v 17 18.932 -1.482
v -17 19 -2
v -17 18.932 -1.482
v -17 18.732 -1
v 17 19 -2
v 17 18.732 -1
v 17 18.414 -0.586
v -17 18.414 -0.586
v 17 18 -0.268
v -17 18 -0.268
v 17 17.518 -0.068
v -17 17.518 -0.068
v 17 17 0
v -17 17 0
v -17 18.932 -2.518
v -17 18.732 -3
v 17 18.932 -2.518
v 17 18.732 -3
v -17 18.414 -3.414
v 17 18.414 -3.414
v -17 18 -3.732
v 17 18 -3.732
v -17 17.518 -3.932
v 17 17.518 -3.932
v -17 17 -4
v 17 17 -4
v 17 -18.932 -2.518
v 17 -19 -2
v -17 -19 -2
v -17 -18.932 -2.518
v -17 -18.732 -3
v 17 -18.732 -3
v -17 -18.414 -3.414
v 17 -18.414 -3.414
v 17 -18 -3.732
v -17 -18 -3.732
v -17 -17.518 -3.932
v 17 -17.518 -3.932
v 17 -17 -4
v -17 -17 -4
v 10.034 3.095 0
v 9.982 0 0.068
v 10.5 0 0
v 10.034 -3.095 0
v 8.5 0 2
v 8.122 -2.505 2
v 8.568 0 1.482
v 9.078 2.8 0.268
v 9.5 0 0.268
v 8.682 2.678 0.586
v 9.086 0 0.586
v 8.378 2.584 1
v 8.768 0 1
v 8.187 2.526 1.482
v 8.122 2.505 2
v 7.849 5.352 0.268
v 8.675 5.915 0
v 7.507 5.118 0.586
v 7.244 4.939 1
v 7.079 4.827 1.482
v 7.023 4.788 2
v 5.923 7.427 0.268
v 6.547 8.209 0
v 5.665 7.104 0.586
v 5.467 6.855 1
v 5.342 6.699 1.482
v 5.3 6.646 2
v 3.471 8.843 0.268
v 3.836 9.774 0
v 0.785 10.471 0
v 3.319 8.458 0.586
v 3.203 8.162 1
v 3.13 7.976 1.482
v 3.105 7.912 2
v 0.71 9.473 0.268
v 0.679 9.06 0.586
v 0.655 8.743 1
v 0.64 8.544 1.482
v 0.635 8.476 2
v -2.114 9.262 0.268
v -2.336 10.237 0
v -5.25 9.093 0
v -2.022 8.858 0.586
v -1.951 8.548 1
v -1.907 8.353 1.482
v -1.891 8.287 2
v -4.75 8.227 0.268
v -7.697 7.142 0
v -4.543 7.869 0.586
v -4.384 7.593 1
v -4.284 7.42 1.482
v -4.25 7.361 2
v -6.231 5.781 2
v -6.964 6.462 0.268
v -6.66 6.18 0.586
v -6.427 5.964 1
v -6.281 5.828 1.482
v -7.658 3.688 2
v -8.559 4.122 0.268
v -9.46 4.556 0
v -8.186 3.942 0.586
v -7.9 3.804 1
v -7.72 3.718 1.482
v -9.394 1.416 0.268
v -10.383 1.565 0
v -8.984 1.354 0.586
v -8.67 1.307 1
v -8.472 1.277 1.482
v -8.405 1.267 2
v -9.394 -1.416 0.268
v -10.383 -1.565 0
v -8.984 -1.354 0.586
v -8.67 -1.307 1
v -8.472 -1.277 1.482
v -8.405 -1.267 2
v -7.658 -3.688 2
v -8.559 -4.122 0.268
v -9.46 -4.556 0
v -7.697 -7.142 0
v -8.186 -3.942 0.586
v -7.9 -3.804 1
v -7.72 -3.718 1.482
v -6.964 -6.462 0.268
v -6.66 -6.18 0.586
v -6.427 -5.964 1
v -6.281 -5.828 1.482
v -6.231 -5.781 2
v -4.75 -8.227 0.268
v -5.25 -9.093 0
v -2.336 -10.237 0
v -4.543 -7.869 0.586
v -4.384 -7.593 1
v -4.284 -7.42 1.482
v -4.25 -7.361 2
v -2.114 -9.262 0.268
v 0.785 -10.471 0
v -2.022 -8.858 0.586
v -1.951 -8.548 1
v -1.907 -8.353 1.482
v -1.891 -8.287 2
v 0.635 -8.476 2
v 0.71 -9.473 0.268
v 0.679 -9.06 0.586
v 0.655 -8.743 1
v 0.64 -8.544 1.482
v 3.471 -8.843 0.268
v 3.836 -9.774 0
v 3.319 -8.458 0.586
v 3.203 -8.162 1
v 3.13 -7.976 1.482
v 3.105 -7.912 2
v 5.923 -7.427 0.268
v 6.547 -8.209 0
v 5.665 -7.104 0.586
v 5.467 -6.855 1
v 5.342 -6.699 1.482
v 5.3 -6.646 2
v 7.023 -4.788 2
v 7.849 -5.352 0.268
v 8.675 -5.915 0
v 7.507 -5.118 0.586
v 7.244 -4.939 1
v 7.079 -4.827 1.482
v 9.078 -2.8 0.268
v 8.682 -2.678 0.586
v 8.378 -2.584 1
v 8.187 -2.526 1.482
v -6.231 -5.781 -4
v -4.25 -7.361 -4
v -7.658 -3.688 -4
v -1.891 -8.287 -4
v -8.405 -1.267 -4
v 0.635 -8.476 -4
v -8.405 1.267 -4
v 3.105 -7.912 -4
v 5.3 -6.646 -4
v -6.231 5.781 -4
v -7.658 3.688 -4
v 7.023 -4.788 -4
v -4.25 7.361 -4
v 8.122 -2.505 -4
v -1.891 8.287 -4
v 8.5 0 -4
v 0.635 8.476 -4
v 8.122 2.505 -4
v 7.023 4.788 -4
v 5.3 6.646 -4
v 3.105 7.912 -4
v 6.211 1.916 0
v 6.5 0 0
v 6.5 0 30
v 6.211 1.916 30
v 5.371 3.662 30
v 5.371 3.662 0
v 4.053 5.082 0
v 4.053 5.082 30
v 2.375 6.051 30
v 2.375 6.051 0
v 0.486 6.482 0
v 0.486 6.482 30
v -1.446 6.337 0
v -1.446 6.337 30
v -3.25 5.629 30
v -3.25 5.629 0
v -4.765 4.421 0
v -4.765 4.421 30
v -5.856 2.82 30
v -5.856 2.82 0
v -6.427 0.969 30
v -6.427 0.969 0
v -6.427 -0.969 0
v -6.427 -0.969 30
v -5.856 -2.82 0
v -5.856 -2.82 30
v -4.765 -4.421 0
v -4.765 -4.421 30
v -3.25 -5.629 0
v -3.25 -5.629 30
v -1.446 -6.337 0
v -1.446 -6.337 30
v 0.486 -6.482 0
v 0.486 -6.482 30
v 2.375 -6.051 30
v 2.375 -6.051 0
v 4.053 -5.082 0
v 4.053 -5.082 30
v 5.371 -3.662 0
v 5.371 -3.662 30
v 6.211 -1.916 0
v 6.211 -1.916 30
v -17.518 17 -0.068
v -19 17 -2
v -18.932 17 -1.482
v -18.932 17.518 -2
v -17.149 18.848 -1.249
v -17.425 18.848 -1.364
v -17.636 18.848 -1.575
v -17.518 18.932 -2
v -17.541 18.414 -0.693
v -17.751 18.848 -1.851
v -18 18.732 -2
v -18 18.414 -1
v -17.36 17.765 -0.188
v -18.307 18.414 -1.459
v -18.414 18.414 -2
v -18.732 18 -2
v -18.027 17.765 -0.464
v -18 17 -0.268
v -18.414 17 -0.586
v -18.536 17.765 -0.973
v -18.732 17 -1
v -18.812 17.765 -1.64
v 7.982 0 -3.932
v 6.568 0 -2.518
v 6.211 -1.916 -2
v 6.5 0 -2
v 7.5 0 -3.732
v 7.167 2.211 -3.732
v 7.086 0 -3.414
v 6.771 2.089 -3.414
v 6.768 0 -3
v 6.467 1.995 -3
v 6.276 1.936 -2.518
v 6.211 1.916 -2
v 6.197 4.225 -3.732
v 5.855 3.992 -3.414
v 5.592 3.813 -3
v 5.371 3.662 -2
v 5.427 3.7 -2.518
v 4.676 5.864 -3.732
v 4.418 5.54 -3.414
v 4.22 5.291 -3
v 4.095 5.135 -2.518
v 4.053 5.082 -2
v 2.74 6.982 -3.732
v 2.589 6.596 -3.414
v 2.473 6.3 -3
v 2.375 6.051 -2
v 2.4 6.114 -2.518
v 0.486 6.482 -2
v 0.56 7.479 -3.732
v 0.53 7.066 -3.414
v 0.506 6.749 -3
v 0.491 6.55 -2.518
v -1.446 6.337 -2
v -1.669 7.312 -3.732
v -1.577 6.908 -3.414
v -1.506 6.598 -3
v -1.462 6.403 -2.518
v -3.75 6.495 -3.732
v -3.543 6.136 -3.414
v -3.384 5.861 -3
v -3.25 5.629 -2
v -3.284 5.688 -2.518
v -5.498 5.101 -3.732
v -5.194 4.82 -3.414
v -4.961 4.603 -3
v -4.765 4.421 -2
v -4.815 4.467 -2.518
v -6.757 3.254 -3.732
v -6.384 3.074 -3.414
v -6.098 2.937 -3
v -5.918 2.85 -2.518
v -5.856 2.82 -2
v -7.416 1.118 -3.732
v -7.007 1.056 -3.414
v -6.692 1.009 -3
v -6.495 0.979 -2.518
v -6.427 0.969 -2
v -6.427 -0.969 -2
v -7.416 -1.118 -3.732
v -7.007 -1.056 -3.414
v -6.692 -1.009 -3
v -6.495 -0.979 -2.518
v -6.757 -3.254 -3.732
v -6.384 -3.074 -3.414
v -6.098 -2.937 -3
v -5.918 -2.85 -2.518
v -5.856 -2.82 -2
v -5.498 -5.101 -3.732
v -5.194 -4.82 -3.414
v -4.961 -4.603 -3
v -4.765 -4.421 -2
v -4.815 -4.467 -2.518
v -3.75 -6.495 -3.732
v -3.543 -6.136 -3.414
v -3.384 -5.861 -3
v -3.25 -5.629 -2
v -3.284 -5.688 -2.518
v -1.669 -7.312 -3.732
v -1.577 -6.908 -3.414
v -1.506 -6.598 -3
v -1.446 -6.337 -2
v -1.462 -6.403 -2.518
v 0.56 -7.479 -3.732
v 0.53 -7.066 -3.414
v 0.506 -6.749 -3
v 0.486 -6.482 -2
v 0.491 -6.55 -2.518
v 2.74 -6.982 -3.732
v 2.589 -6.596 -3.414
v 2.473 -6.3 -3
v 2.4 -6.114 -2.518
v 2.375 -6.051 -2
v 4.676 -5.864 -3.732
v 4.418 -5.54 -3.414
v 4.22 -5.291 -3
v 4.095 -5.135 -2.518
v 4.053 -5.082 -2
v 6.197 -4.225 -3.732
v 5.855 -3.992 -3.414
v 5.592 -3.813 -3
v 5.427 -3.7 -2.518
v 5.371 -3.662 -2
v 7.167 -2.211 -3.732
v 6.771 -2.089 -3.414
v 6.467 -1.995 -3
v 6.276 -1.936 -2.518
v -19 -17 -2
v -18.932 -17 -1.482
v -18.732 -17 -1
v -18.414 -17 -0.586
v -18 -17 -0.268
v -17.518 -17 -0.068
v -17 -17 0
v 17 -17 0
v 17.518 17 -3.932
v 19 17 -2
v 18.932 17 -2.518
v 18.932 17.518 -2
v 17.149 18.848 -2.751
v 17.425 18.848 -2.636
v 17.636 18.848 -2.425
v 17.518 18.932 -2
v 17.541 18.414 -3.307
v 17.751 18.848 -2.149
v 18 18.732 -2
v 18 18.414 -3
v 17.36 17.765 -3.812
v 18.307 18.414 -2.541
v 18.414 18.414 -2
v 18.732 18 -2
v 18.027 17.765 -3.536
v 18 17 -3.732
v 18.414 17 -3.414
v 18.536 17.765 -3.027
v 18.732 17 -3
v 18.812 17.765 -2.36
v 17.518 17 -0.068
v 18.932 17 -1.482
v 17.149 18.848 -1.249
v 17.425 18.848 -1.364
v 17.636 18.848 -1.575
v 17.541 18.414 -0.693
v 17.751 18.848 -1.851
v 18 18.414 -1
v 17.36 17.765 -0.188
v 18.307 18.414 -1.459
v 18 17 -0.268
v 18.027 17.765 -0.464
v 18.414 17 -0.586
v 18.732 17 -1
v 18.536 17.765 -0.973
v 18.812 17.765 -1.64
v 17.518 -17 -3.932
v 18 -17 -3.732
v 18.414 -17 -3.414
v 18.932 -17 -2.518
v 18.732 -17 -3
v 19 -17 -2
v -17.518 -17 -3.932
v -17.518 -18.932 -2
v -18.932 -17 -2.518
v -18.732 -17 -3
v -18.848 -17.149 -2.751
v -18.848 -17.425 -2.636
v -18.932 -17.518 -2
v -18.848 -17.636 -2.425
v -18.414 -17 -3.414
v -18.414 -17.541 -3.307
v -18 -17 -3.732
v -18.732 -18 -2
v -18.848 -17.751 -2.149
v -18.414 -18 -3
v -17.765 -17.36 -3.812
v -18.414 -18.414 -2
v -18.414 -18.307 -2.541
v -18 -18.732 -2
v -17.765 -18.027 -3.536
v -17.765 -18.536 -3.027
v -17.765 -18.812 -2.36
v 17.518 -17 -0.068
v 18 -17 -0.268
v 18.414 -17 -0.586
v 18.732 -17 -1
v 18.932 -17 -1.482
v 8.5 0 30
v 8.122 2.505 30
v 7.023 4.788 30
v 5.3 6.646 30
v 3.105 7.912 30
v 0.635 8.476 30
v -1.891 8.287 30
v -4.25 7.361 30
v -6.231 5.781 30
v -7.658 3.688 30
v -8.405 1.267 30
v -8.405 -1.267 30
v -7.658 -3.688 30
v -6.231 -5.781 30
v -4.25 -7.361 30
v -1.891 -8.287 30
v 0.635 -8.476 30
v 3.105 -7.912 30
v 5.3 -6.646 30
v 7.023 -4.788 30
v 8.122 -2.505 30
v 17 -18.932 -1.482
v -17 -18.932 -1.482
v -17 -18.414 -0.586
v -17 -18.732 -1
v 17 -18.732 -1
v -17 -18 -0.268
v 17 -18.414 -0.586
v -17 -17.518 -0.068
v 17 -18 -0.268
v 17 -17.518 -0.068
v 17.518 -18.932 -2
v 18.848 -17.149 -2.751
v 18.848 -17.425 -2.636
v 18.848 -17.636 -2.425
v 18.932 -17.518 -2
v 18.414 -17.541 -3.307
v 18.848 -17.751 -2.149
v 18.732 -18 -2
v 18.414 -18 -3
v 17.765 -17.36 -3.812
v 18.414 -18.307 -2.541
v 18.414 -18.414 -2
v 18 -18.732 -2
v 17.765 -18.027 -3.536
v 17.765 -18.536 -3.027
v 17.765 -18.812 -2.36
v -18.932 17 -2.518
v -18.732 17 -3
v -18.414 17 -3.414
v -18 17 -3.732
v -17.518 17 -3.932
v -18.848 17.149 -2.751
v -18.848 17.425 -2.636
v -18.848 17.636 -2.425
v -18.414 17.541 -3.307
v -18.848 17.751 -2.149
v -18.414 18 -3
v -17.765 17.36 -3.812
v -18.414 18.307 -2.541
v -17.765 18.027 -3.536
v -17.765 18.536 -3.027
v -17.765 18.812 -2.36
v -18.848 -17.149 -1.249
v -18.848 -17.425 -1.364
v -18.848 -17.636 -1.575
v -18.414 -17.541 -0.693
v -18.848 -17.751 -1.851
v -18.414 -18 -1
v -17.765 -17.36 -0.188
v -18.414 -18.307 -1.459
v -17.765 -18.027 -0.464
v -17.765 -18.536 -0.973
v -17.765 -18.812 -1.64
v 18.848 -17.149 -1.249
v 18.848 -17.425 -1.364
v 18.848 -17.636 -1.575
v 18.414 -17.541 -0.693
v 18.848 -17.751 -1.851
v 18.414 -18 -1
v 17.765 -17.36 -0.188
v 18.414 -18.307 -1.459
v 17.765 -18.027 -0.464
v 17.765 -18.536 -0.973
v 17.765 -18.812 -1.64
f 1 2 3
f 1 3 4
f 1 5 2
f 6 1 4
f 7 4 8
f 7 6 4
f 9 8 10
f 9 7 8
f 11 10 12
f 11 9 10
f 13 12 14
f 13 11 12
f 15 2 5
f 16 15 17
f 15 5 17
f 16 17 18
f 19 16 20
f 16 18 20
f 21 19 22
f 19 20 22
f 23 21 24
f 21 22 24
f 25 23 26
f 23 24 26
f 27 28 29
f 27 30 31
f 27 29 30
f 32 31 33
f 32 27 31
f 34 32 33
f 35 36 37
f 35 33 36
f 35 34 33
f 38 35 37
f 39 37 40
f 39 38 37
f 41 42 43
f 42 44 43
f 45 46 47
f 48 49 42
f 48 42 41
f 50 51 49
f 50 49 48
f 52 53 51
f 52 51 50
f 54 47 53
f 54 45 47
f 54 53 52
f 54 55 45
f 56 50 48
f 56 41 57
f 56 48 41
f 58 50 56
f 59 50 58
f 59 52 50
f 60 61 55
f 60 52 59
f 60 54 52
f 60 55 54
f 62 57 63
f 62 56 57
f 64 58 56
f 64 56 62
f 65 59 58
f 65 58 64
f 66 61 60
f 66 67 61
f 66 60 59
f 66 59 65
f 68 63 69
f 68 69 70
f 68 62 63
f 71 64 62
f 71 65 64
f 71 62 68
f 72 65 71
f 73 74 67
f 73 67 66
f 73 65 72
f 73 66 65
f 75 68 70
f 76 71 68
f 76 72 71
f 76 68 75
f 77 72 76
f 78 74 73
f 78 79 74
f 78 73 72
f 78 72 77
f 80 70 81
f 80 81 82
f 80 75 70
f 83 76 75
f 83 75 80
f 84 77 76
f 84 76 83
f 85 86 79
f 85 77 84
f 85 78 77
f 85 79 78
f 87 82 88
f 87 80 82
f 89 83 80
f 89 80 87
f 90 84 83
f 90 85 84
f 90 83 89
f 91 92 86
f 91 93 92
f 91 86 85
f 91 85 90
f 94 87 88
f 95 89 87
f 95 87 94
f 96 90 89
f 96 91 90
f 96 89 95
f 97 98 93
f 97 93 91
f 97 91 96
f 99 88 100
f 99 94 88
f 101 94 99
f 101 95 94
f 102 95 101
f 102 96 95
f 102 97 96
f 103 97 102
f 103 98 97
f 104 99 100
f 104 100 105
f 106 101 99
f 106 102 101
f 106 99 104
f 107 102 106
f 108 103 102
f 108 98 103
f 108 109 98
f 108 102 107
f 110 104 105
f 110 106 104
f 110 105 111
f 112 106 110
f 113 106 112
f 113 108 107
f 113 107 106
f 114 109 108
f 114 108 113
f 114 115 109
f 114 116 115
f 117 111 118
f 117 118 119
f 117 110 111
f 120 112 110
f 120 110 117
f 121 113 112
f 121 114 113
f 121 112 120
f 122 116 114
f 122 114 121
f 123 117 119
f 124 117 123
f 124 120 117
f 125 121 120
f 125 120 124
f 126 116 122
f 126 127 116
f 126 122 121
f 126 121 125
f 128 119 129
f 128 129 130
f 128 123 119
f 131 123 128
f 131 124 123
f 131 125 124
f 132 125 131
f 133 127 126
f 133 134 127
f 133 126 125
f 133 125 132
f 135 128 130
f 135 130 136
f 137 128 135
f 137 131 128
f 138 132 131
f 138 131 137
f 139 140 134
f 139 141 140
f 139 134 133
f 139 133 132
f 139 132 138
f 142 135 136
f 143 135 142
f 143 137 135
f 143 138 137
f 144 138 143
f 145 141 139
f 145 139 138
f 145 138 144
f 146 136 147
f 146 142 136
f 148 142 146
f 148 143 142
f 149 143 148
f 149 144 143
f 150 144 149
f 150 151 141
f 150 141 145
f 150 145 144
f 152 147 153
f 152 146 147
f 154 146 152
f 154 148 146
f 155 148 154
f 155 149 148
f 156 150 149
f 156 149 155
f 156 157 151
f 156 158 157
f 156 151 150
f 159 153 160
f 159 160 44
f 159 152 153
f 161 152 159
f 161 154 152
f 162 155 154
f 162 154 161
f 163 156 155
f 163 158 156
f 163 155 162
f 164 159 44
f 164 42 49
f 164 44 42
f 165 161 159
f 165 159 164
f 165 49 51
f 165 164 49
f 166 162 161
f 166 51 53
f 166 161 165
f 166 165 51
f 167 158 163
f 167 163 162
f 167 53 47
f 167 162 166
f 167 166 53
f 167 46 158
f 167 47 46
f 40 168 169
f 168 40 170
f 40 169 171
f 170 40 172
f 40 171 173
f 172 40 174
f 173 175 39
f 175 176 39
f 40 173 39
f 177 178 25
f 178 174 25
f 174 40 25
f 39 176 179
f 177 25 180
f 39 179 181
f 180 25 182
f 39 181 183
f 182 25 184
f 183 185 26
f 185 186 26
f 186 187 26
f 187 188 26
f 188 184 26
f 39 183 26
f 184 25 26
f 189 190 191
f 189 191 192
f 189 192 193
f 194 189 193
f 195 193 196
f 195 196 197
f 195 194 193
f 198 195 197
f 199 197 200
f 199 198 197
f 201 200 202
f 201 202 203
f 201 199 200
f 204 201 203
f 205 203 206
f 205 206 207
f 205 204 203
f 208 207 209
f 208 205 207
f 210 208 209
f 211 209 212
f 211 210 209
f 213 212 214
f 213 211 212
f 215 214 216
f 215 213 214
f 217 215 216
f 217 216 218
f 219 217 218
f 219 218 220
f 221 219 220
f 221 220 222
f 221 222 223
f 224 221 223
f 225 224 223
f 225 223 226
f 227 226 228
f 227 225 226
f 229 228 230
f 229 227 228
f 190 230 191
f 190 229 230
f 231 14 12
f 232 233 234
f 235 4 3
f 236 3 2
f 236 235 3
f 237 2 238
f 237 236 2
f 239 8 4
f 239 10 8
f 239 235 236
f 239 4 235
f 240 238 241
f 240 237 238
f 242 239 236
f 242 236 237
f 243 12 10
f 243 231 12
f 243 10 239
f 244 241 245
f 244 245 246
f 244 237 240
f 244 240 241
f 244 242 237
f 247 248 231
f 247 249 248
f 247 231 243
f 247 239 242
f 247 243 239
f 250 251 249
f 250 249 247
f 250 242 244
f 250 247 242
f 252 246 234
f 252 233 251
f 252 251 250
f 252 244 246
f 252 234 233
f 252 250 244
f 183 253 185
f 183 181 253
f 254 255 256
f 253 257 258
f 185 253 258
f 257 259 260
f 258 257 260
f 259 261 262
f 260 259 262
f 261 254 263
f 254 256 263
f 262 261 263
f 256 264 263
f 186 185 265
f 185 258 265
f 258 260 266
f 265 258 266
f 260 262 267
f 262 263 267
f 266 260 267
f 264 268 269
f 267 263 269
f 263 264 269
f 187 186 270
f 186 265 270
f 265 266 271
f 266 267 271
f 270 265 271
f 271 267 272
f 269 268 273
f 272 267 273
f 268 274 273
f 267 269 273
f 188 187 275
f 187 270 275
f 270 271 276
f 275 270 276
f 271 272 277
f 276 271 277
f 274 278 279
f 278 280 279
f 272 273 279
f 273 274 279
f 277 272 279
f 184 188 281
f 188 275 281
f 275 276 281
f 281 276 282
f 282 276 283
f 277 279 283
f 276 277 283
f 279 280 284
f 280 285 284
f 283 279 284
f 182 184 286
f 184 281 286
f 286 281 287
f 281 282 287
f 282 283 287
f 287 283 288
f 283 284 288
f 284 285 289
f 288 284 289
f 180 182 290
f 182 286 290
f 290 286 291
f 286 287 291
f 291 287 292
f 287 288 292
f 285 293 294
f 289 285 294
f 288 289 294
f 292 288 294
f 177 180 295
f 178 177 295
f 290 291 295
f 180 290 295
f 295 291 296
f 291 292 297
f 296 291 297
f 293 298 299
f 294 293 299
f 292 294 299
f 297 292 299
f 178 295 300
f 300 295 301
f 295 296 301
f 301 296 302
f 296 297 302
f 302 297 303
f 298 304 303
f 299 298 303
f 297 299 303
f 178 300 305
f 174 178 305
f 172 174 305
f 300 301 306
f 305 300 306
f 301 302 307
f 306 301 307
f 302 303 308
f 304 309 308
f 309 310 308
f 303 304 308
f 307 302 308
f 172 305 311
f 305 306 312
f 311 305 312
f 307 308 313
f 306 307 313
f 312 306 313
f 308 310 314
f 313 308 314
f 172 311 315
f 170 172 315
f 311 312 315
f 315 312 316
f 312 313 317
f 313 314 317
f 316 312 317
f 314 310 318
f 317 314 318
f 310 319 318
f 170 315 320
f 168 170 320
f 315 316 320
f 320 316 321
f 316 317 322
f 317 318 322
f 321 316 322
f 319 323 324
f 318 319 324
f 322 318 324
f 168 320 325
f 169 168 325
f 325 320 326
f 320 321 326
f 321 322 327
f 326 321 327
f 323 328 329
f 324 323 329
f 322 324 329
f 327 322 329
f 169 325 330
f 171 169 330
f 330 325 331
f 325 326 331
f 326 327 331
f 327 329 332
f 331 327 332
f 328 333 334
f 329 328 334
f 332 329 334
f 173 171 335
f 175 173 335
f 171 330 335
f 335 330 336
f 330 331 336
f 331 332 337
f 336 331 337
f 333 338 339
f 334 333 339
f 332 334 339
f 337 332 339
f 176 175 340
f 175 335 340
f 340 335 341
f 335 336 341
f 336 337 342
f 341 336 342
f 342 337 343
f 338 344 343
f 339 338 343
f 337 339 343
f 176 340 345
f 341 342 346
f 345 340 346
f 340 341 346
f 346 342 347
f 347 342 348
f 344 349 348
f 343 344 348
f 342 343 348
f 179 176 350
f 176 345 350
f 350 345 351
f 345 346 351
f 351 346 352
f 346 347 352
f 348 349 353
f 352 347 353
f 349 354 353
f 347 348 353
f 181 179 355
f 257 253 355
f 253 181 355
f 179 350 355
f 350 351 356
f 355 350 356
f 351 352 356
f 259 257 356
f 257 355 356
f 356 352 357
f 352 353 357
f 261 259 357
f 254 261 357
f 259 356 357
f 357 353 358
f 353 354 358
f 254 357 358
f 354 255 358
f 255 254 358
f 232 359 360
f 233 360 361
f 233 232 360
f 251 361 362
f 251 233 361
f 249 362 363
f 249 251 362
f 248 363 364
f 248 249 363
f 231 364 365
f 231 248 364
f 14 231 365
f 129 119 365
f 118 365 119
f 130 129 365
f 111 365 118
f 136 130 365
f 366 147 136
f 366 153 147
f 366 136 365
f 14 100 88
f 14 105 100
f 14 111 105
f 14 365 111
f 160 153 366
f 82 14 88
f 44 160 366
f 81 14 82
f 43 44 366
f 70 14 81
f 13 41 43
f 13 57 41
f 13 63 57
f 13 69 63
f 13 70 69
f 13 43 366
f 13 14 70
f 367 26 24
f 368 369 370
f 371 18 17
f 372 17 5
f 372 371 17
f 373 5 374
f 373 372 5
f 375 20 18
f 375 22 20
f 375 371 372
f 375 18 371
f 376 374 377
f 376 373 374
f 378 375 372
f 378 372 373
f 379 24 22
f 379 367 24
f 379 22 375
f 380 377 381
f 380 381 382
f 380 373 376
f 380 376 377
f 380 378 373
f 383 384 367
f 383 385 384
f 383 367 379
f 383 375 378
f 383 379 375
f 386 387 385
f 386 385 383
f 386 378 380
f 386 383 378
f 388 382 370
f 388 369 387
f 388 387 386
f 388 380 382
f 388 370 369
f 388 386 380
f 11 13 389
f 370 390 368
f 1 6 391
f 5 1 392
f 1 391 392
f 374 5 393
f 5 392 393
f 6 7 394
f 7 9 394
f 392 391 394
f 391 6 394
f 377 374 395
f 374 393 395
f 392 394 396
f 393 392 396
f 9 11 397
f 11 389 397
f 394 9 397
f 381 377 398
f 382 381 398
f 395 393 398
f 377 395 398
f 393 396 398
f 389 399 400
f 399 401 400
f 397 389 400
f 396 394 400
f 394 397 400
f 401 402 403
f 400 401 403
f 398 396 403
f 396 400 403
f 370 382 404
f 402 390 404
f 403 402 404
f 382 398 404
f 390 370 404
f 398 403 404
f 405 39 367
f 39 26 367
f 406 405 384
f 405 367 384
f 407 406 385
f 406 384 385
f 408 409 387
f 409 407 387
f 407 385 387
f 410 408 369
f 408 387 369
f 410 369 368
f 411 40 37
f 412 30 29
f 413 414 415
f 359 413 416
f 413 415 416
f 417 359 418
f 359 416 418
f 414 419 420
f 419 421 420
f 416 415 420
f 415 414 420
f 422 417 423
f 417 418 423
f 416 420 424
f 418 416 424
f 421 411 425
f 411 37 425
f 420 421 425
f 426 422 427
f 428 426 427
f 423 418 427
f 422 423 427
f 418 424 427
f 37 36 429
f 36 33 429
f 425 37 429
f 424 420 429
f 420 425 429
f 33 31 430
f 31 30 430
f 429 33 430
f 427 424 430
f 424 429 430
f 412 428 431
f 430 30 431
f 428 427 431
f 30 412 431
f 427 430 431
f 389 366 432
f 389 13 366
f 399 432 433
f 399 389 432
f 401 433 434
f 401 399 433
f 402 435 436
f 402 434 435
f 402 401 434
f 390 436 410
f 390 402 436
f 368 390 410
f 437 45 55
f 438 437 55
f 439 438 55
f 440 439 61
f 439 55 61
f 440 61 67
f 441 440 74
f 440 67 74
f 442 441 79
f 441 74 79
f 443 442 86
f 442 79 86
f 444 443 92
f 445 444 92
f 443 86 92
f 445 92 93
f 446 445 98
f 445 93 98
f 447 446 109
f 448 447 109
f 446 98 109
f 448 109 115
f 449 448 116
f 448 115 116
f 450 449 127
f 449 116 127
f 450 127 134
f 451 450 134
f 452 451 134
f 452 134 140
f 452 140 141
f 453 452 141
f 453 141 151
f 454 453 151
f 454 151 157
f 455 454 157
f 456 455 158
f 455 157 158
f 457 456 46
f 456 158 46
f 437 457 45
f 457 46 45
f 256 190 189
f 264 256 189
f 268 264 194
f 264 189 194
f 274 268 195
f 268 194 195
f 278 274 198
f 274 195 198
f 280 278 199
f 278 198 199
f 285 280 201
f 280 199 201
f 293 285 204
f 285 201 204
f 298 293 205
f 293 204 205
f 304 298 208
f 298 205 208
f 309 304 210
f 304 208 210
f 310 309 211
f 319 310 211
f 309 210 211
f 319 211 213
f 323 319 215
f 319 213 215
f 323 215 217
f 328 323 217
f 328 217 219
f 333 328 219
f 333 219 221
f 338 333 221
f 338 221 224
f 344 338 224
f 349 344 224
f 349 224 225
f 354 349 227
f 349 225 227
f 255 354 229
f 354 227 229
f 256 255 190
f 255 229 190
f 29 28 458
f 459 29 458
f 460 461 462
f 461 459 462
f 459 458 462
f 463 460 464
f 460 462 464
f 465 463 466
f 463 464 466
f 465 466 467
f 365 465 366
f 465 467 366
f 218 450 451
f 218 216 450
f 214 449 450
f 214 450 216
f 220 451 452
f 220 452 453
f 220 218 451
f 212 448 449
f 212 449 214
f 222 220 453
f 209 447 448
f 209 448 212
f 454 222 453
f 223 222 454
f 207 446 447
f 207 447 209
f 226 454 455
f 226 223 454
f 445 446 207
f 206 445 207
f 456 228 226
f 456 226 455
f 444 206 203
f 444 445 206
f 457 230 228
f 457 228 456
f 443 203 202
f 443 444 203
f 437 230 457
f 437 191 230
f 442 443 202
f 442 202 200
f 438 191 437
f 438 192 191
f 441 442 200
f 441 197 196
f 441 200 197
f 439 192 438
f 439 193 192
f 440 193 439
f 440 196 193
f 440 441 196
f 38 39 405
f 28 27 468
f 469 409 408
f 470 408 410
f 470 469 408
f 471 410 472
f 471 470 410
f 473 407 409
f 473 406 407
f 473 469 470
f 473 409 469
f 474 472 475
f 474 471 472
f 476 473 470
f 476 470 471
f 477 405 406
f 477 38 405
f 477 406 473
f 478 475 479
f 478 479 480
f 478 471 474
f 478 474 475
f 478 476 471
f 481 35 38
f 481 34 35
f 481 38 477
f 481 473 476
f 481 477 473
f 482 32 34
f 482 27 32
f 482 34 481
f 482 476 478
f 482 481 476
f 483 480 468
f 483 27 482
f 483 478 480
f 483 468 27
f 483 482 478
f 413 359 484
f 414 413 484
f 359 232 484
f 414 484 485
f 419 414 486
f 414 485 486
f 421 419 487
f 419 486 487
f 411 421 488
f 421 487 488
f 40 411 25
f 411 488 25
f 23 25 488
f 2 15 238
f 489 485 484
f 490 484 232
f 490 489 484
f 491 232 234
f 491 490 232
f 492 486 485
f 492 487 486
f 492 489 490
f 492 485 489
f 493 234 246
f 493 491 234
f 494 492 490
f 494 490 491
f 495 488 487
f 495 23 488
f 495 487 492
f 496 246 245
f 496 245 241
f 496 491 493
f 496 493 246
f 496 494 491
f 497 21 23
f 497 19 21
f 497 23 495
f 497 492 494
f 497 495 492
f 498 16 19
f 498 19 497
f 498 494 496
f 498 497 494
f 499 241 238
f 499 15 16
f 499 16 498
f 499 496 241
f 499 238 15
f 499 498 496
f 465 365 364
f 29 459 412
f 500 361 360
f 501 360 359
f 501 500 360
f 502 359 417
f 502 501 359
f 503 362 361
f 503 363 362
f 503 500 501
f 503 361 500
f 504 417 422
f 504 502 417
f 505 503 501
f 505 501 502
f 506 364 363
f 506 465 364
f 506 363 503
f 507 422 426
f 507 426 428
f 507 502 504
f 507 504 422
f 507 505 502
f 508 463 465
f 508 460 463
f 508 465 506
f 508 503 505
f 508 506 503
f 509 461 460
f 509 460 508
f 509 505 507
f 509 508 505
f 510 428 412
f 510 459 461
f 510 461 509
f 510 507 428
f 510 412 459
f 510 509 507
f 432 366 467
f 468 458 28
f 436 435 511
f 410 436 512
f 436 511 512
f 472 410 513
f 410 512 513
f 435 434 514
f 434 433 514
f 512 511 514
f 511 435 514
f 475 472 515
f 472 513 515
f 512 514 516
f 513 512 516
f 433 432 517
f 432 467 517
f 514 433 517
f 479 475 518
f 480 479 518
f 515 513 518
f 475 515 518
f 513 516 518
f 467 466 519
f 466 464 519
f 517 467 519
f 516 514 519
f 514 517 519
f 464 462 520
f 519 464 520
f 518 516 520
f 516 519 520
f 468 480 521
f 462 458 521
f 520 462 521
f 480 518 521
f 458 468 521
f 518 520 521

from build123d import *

# Parameters (mm, degrees)
F0_R     = 8.5
F0_R_2   = 6.5
F1_DEPTH = 30
F2_W     = 38
F2_H     = 38
F2_R     = 6.5
F3_DEPTH = 4
F4_R     = 1.99999


# Not quite as in the source:
# - a fillet or chamfer is up to 0.001 mm smaller than in the source, because OpenCascade refuses the exact size


with BuildPart() as f1:
    # F0 (on Top) → F1 (new body)
    with BuildSketch(Plane.XY):
        Circle(F0_R)
        Circle(F0_R_2, mode=Mode.SUBTRACT)
    extrude(amount=F1_DEPTH)

    # F2 (on Top) → F3 (join)
    with BuildSketch(Plane.XY):
        Rectangle(F2_W, F2_H)
        Circle(F2_R, mode=Mode.SUBTRACT)
    extrude(amount=-F3_DEPTH)

    # F4 (radius 2 in the source; OpenCascade refuses exactly that, so slightly less here)
    f4_edges = [f1.edges().sort_by_distance(p)[0] for p in [
        (0, -19, -4),
        (19, 0, -4),
        (0, 19, -4),
        (-19, 0, -4),
        (-6.5, 0, -4),
        (0, -19, 0),
        (-19, 0, 0),
        (19, 0, 0),
        (0, 19, 0),
        (-8.5, 0, 0),
        (19, 19, -2),
        (-19, 19, -2),
        (19, -19, -2),
        (-19, -19, -2),
    ]]
    fillet(f4_edges, radius=F4_R)


solid = f1.part
